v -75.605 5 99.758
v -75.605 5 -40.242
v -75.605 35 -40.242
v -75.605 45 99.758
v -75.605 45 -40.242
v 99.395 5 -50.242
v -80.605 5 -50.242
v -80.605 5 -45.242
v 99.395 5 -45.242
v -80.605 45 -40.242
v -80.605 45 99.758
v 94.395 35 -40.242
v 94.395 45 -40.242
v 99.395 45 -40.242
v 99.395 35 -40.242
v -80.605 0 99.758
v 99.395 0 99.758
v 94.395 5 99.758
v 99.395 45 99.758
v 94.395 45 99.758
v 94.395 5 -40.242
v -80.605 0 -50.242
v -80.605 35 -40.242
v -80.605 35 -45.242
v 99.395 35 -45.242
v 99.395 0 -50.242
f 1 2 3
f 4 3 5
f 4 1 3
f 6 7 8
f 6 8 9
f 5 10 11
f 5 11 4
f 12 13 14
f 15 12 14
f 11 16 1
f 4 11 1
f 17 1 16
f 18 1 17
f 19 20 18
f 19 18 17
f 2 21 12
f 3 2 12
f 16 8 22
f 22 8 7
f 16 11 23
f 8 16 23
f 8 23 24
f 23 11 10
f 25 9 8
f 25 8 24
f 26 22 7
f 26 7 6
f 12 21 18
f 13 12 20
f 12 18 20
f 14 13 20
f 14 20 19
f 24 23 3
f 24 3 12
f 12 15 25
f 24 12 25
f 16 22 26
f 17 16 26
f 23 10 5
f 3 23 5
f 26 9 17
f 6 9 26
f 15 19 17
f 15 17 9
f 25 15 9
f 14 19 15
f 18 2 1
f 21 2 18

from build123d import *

# Parameters (mm, degrees)
SKETCH1_W           = 180
SKETCH1_H           = 150
BOSS_EXTRUDE1_DEPTH = 5
SKETCH5_W           = 5
SKETCH5_H           = 40
BOSS_EXTRUDE2_DEPTH = 140
SKETCH13_W          = 5
SKETCH13_H          = 30
BOSS_EXTRUDE9_DEPTH = 180


with BuildPart() as part:
    # Sketch1 → Boss-Extrude1 (new body)
    with BuildSketch(Plane(origin=(0, 0, 0), x_dir=(1, 0, 0), z_dir=(0, 1, 0))):
        with Locations((9.394856278, -24.757942511)):
            Rectangle(SKETCH1_W, SKETCH1_H)
    extrude(amount=BOSS_EXTRUDE1_DEPTH)

    # Sketch5 → Boss-Extrude2 (add)
    with BuildSketch(Plane.XY.offset(99.757942511)):
        with Locations((-78.105143722, 25)):
            Rectangle(SKETCH5_W, SKETCH5_H)
        with Locations((96.894856278, 25)):
            Rectangle(SKETCH5_W, SKETCH5_H)
    extrude(amount=-BOSS_EXTRUDE2_DEPTH)

    # Sketch13 → Boss-Extrude9 (add)
    with BuildSketch(Plane(origin=(99.394856278, 0, 0), x_dir=(0, 0, -1), z_dir=(1, 0, 0))):
        with Locations((42.742057489, 20)):
            Rectangle(SKETCH13_W, SKETCH13_H)
    extrude(amount=-BOSS_EXTRUDE9_DEPTH)


solid = part.part
